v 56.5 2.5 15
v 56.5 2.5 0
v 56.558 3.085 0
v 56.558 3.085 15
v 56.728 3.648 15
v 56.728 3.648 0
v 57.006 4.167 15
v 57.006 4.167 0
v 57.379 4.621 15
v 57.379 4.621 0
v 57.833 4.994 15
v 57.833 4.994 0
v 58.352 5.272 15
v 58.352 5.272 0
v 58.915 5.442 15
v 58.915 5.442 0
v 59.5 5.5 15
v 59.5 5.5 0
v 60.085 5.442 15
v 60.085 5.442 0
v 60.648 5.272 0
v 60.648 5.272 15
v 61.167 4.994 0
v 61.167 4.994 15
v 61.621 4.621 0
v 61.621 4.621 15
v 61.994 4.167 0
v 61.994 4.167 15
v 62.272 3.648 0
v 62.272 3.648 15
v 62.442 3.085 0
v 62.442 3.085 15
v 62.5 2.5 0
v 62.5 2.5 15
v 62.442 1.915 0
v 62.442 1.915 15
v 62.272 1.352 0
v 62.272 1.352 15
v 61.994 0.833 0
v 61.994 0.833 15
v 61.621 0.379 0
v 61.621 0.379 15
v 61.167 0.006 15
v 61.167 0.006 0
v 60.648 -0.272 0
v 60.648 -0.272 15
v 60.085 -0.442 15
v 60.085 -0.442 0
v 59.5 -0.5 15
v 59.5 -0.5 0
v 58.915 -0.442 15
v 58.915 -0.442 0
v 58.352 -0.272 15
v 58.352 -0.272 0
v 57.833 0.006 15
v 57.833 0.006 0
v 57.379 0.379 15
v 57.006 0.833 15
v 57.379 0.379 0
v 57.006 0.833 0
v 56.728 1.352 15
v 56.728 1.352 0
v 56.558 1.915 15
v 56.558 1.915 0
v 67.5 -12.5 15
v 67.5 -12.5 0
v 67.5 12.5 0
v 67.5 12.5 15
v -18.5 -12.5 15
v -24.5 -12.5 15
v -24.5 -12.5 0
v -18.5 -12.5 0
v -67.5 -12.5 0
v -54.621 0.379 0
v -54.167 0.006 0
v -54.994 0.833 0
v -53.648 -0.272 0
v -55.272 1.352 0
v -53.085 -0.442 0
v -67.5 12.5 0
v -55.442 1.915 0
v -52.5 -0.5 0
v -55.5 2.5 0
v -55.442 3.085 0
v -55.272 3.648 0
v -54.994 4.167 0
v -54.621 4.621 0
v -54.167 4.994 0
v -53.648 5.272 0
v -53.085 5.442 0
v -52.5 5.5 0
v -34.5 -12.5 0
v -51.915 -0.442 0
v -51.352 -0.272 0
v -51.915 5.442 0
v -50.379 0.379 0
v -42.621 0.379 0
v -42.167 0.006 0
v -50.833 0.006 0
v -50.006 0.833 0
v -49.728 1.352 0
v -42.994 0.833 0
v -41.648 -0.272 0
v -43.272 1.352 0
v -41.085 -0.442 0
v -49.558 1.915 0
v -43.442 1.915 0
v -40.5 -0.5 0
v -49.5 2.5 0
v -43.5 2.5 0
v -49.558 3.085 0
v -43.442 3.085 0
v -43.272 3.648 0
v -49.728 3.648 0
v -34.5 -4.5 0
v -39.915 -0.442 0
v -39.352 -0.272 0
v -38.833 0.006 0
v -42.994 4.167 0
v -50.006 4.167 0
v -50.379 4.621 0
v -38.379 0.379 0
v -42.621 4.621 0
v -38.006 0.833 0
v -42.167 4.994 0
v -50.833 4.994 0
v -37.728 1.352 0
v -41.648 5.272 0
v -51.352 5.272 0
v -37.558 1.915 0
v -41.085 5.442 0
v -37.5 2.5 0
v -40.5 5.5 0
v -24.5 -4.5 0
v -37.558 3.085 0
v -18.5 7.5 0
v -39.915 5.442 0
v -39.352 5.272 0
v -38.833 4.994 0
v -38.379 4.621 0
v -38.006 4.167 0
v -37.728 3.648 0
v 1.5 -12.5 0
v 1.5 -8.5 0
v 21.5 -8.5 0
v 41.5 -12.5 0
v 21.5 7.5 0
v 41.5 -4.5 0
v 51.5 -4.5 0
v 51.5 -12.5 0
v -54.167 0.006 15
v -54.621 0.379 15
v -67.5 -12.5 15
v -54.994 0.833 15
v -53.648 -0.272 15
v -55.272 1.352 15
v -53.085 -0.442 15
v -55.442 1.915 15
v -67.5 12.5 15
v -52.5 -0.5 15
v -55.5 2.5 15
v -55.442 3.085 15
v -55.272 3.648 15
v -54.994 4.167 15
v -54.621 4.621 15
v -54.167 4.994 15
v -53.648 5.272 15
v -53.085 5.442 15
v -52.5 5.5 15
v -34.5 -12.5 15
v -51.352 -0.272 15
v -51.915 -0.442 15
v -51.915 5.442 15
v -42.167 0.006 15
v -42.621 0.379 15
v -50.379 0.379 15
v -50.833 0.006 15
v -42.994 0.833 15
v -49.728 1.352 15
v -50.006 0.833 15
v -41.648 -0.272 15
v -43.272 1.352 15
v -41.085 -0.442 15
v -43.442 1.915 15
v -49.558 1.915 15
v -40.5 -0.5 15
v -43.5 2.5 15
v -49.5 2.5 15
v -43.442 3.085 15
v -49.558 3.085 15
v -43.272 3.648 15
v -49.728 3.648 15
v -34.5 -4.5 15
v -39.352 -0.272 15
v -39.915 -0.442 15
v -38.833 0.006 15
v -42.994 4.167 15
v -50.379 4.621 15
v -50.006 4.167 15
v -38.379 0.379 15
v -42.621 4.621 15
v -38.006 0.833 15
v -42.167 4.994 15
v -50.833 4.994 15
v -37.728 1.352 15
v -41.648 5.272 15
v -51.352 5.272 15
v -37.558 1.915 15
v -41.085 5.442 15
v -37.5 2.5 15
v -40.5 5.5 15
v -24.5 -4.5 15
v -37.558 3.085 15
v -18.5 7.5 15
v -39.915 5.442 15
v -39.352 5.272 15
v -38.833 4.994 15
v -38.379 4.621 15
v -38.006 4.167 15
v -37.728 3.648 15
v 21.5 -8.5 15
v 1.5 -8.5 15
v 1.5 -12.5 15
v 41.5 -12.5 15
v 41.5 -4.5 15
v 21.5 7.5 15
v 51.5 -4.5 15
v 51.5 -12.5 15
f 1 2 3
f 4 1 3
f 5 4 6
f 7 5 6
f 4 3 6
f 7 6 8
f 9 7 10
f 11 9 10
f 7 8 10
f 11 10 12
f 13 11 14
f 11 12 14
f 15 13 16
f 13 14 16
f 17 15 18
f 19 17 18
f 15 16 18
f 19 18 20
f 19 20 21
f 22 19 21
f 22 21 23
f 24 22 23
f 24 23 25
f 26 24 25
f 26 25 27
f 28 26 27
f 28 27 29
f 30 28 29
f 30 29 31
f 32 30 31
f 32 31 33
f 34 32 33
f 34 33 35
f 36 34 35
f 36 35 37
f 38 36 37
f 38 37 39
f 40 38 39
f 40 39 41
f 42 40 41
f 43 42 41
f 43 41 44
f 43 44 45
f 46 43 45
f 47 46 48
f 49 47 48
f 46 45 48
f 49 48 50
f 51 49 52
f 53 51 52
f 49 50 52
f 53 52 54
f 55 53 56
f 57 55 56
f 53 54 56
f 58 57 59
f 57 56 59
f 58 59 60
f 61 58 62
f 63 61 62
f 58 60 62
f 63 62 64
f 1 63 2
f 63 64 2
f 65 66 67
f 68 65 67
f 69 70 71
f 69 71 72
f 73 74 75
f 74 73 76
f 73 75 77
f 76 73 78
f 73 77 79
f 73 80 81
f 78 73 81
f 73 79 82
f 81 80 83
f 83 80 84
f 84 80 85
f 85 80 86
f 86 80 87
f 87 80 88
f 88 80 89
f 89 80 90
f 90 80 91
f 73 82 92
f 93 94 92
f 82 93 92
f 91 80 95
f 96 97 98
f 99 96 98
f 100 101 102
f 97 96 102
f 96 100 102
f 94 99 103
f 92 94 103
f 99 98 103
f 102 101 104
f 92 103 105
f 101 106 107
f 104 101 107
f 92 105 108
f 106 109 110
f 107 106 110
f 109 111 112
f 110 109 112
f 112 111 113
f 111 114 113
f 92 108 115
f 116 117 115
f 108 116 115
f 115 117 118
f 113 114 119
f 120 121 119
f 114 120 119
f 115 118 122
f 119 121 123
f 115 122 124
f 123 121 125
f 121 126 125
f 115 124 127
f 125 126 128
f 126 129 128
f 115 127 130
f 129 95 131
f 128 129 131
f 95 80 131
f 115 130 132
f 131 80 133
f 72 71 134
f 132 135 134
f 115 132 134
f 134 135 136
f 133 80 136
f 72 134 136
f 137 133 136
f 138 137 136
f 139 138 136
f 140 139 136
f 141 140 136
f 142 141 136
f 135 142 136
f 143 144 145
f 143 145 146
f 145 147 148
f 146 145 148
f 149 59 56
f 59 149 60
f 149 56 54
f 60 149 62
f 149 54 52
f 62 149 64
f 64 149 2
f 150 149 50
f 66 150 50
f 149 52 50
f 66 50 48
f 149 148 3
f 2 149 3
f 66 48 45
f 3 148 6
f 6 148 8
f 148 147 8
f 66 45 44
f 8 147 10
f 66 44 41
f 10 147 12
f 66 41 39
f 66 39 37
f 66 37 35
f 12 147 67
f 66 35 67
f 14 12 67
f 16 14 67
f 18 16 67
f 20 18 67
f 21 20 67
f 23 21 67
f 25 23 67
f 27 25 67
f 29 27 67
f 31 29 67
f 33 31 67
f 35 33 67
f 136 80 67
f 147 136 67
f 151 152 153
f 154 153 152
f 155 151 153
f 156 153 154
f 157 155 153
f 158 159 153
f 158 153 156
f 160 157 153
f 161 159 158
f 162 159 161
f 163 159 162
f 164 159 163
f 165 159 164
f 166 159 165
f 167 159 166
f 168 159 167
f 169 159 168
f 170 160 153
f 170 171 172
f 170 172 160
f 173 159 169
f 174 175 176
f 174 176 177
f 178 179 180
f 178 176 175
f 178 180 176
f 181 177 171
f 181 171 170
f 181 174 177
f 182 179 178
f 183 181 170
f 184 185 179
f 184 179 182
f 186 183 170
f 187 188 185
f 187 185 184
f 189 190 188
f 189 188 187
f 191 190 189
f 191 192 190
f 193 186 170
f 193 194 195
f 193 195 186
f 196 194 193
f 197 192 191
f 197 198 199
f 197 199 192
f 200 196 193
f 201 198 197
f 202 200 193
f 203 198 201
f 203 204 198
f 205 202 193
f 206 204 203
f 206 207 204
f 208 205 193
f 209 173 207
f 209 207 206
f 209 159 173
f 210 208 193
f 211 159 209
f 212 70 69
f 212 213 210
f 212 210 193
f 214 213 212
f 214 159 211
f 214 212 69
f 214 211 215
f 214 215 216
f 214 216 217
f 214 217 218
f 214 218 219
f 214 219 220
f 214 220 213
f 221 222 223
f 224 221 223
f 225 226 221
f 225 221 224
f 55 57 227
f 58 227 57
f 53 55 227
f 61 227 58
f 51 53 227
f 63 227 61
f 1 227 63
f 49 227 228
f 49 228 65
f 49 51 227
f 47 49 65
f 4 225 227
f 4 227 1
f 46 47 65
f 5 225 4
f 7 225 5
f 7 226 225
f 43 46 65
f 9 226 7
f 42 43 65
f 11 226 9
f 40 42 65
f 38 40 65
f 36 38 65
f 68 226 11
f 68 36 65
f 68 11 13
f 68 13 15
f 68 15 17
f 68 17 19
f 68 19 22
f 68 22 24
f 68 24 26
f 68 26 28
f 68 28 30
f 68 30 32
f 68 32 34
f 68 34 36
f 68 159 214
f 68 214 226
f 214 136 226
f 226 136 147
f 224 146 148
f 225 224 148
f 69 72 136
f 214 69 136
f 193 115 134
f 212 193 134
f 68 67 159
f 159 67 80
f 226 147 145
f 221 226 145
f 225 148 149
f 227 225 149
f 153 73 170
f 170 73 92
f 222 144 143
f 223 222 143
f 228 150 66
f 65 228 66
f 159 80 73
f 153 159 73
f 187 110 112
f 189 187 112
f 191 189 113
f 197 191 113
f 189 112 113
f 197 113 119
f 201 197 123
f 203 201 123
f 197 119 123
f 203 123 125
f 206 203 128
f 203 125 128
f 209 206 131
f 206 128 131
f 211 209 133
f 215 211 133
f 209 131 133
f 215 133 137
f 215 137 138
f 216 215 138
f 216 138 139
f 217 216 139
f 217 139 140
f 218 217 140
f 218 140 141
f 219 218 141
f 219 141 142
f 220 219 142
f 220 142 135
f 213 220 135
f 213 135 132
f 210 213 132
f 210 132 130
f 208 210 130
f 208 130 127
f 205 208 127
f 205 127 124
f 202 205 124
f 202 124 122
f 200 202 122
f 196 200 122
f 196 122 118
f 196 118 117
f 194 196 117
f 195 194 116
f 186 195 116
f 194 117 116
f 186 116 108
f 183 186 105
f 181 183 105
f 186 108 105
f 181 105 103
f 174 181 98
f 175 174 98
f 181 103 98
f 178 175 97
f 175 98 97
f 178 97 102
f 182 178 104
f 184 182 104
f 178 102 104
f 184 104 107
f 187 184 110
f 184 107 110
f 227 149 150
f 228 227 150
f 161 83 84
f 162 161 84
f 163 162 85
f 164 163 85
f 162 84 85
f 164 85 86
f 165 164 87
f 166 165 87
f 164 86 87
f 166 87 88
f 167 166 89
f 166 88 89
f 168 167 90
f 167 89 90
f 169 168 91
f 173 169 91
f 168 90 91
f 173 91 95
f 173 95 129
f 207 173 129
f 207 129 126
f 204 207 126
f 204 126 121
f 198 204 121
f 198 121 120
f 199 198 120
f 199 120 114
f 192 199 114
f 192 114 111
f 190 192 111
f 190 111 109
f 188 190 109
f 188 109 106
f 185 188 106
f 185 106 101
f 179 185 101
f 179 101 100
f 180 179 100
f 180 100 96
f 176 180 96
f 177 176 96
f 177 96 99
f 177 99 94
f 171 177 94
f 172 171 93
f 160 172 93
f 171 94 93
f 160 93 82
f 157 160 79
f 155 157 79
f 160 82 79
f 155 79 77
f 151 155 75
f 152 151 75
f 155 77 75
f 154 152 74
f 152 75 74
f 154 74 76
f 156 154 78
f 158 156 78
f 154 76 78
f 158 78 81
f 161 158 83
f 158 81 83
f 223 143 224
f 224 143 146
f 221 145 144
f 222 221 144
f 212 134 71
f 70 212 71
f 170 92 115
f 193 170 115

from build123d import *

# Parameters (mm, degrees)
F1_DEPTH = 15
F3_D     = 6


with BuildPart() as f1:
    # F0 (on Top) → F1 (new body)
    with BuildSketch(Plane.XY):
        Polygon((67.5, -12.5), (67.5, 12.5), (-67.5, 12.5), (-67.5, -12.5), (-34.5, -12.5), (-34.5, -4.5), (-24.5, -4.5), (-24.5, -12.5), (-18.5, -12.5), (-18.5, 7.5), (21.5, 7.5), (21.5, -8.5), (1.5, -8.5), (1.5, -12.5), (41.5, -12.5), (41.5, -4.5), (51.5, -4.5), (51.5, -12.5), align=None)
    extrude(amount=F1_DEPTH)

    # F3 (through all)
    with Locations(Plane.XY.offset(15)):
        with Locations((-52.5, 2.5), (-40.5, 2.5), (59.5, 2.5)):
            Hole(F3_D / 2)


solid = f1.part
